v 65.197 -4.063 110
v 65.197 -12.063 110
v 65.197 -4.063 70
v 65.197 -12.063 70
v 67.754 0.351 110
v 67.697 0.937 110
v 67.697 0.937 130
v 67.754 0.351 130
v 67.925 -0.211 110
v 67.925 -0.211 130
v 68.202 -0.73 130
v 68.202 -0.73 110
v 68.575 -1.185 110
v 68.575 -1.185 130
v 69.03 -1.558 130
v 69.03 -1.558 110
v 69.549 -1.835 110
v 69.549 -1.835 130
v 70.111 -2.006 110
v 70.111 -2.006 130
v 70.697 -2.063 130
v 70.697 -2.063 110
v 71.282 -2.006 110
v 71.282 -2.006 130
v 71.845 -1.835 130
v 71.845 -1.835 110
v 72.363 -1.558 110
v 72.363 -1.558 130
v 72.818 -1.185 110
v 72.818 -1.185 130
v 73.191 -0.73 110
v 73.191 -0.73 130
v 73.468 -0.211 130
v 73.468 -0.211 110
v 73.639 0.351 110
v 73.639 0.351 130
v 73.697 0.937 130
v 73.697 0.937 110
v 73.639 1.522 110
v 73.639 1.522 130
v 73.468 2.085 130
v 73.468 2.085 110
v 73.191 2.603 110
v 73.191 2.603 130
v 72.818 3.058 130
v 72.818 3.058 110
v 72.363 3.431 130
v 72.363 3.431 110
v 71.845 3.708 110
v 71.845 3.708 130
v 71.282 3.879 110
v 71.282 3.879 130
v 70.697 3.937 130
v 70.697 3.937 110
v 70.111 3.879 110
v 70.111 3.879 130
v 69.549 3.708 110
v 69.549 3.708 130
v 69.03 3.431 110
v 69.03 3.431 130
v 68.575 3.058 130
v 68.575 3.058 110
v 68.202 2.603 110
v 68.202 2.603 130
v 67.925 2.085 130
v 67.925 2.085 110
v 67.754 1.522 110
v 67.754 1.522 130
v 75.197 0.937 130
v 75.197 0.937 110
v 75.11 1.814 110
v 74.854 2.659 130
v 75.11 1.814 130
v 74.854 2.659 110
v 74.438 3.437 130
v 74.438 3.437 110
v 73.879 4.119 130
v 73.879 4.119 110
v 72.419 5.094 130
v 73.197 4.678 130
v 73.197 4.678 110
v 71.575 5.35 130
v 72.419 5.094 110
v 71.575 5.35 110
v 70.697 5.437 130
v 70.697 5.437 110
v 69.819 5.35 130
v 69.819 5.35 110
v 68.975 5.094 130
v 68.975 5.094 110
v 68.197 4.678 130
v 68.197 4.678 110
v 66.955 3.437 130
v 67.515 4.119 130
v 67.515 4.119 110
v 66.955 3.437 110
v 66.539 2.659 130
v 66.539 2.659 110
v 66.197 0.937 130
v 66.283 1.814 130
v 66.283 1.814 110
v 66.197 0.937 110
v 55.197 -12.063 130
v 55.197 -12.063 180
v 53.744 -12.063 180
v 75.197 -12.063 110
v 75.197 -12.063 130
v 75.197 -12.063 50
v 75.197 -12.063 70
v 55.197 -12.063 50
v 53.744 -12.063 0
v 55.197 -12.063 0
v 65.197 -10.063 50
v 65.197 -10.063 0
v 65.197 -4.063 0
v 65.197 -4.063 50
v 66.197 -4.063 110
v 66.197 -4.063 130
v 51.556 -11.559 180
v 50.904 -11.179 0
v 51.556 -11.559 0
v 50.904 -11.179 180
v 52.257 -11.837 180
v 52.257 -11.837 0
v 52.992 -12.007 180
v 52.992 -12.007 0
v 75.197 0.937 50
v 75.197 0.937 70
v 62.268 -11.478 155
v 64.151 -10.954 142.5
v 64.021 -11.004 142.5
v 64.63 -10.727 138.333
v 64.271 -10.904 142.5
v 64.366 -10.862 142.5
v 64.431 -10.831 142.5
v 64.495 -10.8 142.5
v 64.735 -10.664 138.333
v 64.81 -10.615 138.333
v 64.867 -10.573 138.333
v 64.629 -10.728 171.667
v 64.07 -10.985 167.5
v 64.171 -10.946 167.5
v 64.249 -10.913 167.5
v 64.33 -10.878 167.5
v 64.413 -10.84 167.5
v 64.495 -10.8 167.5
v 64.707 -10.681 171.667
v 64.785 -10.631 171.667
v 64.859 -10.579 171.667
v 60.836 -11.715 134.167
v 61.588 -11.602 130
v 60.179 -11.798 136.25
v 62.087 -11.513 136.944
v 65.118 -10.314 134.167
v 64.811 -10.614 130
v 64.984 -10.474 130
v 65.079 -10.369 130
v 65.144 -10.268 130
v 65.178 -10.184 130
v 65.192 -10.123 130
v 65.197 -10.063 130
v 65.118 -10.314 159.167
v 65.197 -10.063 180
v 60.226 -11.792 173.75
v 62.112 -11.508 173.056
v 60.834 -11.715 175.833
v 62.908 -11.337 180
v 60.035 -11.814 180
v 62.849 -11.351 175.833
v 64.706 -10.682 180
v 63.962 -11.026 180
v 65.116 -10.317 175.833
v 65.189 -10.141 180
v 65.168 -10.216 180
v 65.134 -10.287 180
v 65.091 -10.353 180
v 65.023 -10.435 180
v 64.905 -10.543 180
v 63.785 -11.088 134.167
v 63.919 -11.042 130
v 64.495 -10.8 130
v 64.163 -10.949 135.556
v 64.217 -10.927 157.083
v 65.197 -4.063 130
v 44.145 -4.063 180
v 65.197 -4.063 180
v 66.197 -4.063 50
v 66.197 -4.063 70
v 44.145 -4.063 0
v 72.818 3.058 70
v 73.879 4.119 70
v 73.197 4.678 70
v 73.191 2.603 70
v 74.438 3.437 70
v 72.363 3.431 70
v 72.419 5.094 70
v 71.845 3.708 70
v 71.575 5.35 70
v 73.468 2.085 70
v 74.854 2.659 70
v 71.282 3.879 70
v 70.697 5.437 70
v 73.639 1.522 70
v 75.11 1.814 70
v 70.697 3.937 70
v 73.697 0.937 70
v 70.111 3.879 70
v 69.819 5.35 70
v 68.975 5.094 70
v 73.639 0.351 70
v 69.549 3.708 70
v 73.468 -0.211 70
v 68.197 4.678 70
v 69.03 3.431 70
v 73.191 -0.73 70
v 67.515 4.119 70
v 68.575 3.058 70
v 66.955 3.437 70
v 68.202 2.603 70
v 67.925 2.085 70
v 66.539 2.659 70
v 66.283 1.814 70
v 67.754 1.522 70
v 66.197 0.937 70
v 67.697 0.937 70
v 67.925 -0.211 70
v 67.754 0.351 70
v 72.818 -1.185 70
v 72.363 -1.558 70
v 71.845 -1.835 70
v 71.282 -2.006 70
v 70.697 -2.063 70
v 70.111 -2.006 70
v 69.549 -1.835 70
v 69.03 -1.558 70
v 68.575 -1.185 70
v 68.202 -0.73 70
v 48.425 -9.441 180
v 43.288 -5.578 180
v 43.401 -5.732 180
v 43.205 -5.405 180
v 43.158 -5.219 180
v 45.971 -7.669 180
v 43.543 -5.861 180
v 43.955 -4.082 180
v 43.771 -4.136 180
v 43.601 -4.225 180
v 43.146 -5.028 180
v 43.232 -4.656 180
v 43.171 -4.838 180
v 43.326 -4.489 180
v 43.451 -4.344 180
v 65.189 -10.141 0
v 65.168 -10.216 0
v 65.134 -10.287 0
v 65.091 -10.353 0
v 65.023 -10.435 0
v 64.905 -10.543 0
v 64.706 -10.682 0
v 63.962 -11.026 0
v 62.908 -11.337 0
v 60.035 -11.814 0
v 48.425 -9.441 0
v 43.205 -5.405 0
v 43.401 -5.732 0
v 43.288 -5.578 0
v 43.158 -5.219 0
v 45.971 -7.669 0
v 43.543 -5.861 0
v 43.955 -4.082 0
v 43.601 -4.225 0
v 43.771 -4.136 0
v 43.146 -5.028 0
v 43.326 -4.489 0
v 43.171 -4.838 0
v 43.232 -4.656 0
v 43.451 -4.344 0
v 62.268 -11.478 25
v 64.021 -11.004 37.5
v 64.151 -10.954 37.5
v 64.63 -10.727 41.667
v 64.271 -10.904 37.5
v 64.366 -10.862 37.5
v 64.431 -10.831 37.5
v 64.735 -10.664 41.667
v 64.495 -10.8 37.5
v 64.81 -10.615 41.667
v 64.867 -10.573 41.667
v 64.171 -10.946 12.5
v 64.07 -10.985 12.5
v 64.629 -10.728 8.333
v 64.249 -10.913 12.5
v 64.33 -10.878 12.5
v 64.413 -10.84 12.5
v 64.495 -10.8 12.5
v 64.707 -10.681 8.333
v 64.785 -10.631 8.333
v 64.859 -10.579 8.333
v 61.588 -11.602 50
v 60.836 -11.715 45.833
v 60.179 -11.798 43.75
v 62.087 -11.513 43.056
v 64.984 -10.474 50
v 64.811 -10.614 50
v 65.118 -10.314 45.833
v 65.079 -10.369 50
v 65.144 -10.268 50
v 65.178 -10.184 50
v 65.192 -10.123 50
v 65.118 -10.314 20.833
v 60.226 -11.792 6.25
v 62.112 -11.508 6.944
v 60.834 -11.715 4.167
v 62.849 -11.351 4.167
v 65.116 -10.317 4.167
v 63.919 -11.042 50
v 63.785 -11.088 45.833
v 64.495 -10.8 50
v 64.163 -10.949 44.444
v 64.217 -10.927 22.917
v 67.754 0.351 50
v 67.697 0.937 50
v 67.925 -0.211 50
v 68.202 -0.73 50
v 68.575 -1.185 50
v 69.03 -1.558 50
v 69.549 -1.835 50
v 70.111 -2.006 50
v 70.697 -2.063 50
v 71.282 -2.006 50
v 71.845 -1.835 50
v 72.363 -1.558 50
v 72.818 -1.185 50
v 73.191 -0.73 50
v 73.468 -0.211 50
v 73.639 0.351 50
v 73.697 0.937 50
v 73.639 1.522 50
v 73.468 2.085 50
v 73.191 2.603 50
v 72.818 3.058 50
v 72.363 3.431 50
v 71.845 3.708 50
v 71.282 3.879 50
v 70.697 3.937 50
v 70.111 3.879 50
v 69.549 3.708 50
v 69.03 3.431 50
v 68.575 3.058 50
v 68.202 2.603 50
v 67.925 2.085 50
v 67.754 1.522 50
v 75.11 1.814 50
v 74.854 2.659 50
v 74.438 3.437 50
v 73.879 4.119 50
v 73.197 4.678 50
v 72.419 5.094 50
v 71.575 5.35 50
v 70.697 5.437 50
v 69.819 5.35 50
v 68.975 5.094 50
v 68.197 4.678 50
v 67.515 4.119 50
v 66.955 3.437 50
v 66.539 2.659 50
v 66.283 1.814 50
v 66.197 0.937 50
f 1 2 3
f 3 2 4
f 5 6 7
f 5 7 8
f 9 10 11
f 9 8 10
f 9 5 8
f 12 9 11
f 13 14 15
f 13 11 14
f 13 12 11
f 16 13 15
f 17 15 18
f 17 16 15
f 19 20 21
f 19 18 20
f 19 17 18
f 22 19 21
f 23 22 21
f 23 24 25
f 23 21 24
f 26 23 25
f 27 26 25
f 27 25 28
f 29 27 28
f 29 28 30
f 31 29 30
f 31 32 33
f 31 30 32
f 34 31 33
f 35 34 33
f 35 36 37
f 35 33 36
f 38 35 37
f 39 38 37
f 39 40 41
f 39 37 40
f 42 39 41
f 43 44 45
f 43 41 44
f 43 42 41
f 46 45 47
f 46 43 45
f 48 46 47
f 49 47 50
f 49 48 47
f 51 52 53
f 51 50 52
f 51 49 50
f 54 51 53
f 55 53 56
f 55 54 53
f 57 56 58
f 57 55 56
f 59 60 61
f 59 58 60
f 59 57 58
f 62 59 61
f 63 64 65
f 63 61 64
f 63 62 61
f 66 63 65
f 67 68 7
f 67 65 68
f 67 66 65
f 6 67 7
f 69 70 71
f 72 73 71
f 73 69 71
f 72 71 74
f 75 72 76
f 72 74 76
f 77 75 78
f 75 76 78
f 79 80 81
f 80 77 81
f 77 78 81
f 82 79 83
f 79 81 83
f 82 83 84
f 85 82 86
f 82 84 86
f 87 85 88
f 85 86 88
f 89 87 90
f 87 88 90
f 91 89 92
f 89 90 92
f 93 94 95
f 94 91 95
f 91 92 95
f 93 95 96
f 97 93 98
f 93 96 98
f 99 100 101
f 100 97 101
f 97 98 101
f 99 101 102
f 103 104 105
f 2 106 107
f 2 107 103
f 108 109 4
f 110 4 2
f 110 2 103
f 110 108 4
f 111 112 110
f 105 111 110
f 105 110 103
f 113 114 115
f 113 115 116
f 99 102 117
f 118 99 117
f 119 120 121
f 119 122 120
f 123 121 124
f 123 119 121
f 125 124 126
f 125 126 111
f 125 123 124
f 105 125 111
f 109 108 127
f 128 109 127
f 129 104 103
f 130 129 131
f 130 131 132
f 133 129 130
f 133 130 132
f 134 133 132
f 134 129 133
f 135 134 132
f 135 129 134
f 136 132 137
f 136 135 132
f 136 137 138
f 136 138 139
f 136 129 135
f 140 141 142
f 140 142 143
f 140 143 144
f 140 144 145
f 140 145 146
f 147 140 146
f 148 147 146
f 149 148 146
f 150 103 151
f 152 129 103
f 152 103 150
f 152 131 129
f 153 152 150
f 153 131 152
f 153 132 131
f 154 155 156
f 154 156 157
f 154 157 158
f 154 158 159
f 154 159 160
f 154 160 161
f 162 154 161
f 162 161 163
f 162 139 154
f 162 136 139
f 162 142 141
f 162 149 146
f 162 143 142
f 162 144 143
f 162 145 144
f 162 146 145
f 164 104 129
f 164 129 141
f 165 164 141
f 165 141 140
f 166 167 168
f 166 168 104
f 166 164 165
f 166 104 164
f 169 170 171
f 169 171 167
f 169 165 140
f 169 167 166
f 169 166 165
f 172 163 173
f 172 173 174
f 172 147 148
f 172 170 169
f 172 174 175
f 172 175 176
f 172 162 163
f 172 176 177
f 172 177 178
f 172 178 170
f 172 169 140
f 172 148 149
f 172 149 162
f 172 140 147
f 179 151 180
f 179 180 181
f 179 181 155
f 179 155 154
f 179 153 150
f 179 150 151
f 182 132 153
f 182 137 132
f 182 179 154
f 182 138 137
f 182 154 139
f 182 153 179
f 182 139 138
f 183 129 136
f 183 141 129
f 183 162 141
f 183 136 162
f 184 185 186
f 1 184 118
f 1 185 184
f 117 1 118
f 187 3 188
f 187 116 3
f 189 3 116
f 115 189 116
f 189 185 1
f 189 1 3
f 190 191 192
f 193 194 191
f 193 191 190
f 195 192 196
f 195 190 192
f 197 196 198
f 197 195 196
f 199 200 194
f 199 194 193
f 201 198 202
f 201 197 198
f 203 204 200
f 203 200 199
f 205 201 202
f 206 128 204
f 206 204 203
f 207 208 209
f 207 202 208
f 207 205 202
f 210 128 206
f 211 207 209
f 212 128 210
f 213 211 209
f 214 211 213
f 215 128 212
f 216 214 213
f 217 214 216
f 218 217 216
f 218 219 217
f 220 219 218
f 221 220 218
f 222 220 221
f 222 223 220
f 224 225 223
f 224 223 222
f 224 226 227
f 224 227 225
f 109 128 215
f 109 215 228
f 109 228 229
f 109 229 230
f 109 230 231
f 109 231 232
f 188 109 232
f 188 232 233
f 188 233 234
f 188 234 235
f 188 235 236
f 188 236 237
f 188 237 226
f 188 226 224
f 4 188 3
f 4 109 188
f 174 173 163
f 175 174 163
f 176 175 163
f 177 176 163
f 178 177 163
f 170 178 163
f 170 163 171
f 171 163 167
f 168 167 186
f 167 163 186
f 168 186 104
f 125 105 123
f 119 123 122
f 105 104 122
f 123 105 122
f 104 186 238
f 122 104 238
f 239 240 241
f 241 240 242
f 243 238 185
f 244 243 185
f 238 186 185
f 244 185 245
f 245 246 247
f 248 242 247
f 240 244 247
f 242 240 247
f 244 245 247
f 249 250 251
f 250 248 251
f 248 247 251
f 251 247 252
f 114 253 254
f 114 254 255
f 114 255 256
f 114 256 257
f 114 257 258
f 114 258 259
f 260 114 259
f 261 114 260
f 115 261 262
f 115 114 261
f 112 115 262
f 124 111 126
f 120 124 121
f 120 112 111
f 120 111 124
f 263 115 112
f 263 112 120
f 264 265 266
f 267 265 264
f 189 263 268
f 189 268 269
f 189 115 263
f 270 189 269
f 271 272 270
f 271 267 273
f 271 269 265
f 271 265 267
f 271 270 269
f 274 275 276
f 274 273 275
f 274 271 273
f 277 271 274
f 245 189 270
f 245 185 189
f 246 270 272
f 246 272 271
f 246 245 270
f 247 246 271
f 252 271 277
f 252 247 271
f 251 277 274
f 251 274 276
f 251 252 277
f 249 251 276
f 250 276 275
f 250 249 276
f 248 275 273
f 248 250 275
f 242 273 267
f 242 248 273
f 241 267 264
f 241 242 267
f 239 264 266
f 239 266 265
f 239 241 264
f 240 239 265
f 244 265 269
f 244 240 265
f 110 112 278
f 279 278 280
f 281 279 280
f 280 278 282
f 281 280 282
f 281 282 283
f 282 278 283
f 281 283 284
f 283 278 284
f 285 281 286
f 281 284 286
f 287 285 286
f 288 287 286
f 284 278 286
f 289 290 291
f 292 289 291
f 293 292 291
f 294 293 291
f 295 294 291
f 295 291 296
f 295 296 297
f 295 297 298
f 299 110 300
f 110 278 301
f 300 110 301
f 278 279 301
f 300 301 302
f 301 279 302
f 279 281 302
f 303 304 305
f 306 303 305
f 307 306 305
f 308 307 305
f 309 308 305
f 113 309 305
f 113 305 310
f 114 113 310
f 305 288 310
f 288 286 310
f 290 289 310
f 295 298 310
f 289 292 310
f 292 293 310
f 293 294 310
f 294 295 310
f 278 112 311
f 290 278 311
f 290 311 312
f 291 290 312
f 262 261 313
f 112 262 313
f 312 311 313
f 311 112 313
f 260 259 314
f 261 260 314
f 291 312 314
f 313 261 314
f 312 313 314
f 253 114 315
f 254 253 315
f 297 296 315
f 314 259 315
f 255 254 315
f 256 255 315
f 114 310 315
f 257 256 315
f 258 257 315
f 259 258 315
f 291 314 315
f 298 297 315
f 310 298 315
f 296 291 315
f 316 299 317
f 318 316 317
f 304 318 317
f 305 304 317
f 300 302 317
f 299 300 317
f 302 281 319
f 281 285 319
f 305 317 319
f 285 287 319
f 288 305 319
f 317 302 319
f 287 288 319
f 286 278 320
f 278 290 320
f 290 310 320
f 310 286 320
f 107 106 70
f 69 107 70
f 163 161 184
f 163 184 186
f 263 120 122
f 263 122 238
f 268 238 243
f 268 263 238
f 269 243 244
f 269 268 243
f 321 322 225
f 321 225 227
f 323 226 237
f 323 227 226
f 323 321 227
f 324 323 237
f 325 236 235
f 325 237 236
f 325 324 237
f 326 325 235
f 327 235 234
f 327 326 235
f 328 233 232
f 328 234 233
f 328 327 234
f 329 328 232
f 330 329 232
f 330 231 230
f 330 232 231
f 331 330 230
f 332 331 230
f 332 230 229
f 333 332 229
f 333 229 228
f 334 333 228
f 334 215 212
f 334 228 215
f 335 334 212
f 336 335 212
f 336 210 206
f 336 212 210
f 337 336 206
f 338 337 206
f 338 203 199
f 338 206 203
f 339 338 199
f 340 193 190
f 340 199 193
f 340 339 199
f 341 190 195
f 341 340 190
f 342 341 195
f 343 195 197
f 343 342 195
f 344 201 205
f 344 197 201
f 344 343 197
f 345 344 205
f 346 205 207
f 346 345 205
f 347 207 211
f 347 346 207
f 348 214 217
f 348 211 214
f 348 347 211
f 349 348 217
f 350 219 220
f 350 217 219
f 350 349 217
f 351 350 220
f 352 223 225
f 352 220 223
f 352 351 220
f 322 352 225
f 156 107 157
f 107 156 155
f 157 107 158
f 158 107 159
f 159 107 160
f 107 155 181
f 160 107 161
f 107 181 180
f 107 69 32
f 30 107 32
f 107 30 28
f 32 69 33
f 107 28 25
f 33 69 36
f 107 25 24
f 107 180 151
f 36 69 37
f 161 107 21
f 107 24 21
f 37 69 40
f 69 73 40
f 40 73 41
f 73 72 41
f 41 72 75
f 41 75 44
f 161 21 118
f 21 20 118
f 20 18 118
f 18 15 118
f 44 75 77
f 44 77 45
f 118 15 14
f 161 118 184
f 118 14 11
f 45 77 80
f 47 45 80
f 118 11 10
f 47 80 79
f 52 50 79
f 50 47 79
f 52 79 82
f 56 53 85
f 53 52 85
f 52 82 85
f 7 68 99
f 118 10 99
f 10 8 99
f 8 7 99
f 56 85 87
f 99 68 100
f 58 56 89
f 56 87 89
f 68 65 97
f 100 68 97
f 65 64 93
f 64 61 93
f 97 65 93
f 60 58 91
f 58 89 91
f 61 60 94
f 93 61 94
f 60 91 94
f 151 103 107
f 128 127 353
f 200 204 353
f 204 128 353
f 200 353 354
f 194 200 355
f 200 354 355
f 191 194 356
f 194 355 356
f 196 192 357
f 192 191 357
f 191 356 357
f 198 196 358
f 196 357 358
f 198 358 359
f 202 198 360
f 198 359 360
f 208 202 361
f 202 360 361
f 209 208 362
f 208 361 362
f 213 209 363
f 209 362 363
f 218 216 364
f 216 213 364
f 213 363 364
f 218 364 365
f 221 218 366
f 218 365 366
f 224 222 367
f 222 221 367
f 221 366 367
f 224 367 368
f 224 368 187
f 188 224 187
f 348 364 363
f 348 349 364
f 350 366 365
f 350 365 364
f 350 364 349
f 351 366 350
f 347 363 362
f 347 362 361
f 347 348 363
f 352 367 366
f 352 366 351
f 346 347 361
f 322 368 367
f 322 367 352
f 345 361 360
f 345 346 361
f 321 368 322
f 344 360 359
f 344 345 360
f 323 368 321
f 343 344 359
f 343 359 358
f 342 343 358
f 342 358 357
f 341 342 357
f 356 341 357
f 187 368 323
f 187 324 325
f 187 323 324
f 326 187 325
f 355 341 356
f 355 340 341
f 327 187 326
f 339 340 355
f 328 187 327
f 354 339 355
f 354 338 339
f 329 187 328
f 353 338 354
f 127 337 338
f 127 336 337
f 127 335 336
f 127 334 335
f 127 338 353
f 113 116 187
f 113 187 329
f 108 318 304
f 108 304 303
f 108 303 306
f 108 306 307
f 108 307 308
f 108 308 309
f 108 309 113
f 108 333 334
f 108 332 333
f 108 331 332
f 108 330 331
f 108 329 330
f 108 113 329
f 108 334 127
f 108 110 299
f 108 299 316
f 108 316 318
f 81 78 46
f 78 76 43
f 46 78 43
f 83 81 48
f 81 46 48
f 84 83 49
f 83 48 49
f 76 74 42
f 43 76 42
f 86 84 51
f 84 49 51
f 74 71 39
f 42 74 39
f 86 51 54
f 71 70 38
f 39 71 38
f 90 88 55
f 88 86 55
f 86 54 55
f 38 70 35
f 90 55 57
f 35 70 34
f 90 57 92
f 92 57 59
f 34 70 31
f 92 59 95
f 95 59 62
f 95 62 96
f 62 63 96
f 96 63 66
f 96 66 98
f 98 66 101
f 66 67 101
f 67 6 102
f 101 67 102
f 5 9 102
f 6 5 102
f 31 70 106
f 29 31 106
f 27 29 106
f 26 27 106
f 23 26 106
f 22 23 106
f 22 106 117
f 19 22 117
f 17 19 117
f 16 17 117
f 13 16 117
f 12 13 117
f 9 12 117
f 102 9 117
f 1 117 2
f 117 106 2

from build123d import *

# Parameters (mm, degrees)
SKETCH1_R           = 3
BOSS_EXTRUDE2_DEPTH = 180
SKETCH3_W           = 10
SKETCH3_H           = 50
CUT_EXTRUDE1_DEPTH  = 32
SKETCH4_W           = 10
SKETCH4_H           = 40
CUT_EXTRUDE2_DEPTH  = 32
FILLET3_R           = 1
FILLET4_R           = 5
FILLET5_SIZE        = 10
FILLET5_SIZE_2      = 2


with BuildPart() as part:
    # Sketch1 → Boss-Extrude2 (new body)
    # profile 1 of 2: a face of its own
    with BuildSketch(Plane.XY):
        with BuildLine():
            Line((75.196634753, -12.063439291), (75.196634753, 0.936560709))
            ThreePointArc((75.196634753, 0.936560709), (70.696634753, 5.436560709), (66.196634753, 0.936560709))
            Line((66.196634753, 0.936560709), (66.196634753, -4.063439291))
            Line((66.196634753, -4.063439291), (66.196634753, -12.063439291))
            Line((66.196634753, -12.063439291), (75.196634753, -12.063439291))
        make_face()
        with Locations(Location((70.696634753, 0.936560709, 0), (0, 0, 180))):
            Circle(SKETCH1_R, mode=Mode.SUBTRACT)
    # profile 2 of 2: a face of its own
    with BuildSketch(Plane.XY):
        with BuildLine():
            Line((41.196634753, -4.063439291), (66.196634753, -4.063439291))
            Line((66.196634753, -4.063439291), (66.196634753, -12.063439291))
            Line((66.196634753, -12.063439291), (52.196634753, -12.063439291))
            ThreePointArc((52.196634753, -12.063439291), (46.632466814, -8.151670207), (41.196634753, -4.063439291))
        make_face()
    extrude(amount=BOSS_EXTRUDE2_DEPTH)

    # Sketch3 → Cut-Extrude1 (cut)
    with BuildSketch(Plane.XZ.offset(12.063439291)):
        with Locations((70.196634753, 155)):
            Rectangle(SKETCH3_W, SKETCH3_H)
        with Locations((70.196634753, 25)):
            Rectangle(SKETCH3_W, SKETCH3_H)
    extrude(amount=-CUT_EXTRUDE1_DEPTH, mode=Mode.SUBTRACT)

    # Sketch4 → Cut-Extrude2 (cut)
    with BuildSketch(Plane(origin=(0, -12.063439291, 0), x_dir=(-1, 0, 0), z_dir=(0, -1, 0))):
        with Locations((-70.196634753, -90)):
            Rectangle(SKETCH4_W, SKETCH4_H)
    extrude(amount=-CUT_EXTRUDE2_DEPTH, mode=Mode.SUBTRACT)

    # Fillet3
    fillet3_edges = [part.edges().sort_by_distance(p)[0] for p in [
        (41.196634753, -4.063439291, 90),
    ]]
    fillet(fillet3_edges, radius=FILLET3_R)

    # Fillet4
    fillet4_edges = [part.edges().sort_by_distance(p)[0] for p in [
        (52.196634753, -12.063439291, 90),
    ]]
    fillet(fillet4_edges, radius=FILLET4_R)

    # Fillet5
    # an asymmetric fillet: 10, 2 mm, written as the material it takes off along each edge
    with BuildSketch(Plane(origin=(65.196634753, -12.063439291, 205), x_dir=(-1, 0, 0), z_dir=(0, 0, -1))) as fillet5_piece_1:
        with BuildLine():
            Bezier((FILLET5_SIZE, 0), (0, 0), (0, FILLET5_SIZE_2), weights=[1, 0.707106781, 1])
            Line((0, FILLET5_SIZE_2), (0, 0))
            Line((0, 0), (FILLET5_SIZE, 0))
        make_face()
    extrude(amount=75, mode=Mode.SUBTRACT)
    with BuildSketch(Plane(origin=(65.196634753, -12.063439291, -25), x_dir=(-1, 0, 0), z_dir=(0, 0, 1))) as fillet5_piece_2:
        with BuildLine():
            Bezier((FILLET5_SIZE, 0), (0, 0), (0, -FILLET5_SIZE_2), weights=[1, 0.707106781, 1])
            Line((0, -FILLET5_SIZE_2), (0, 0))
            Line((0, 0), (FILLET5_SIZE, 0))
        make_face()
    extrude(amount=75, mode=Mode.SUBTRACT)


solid = part.part
